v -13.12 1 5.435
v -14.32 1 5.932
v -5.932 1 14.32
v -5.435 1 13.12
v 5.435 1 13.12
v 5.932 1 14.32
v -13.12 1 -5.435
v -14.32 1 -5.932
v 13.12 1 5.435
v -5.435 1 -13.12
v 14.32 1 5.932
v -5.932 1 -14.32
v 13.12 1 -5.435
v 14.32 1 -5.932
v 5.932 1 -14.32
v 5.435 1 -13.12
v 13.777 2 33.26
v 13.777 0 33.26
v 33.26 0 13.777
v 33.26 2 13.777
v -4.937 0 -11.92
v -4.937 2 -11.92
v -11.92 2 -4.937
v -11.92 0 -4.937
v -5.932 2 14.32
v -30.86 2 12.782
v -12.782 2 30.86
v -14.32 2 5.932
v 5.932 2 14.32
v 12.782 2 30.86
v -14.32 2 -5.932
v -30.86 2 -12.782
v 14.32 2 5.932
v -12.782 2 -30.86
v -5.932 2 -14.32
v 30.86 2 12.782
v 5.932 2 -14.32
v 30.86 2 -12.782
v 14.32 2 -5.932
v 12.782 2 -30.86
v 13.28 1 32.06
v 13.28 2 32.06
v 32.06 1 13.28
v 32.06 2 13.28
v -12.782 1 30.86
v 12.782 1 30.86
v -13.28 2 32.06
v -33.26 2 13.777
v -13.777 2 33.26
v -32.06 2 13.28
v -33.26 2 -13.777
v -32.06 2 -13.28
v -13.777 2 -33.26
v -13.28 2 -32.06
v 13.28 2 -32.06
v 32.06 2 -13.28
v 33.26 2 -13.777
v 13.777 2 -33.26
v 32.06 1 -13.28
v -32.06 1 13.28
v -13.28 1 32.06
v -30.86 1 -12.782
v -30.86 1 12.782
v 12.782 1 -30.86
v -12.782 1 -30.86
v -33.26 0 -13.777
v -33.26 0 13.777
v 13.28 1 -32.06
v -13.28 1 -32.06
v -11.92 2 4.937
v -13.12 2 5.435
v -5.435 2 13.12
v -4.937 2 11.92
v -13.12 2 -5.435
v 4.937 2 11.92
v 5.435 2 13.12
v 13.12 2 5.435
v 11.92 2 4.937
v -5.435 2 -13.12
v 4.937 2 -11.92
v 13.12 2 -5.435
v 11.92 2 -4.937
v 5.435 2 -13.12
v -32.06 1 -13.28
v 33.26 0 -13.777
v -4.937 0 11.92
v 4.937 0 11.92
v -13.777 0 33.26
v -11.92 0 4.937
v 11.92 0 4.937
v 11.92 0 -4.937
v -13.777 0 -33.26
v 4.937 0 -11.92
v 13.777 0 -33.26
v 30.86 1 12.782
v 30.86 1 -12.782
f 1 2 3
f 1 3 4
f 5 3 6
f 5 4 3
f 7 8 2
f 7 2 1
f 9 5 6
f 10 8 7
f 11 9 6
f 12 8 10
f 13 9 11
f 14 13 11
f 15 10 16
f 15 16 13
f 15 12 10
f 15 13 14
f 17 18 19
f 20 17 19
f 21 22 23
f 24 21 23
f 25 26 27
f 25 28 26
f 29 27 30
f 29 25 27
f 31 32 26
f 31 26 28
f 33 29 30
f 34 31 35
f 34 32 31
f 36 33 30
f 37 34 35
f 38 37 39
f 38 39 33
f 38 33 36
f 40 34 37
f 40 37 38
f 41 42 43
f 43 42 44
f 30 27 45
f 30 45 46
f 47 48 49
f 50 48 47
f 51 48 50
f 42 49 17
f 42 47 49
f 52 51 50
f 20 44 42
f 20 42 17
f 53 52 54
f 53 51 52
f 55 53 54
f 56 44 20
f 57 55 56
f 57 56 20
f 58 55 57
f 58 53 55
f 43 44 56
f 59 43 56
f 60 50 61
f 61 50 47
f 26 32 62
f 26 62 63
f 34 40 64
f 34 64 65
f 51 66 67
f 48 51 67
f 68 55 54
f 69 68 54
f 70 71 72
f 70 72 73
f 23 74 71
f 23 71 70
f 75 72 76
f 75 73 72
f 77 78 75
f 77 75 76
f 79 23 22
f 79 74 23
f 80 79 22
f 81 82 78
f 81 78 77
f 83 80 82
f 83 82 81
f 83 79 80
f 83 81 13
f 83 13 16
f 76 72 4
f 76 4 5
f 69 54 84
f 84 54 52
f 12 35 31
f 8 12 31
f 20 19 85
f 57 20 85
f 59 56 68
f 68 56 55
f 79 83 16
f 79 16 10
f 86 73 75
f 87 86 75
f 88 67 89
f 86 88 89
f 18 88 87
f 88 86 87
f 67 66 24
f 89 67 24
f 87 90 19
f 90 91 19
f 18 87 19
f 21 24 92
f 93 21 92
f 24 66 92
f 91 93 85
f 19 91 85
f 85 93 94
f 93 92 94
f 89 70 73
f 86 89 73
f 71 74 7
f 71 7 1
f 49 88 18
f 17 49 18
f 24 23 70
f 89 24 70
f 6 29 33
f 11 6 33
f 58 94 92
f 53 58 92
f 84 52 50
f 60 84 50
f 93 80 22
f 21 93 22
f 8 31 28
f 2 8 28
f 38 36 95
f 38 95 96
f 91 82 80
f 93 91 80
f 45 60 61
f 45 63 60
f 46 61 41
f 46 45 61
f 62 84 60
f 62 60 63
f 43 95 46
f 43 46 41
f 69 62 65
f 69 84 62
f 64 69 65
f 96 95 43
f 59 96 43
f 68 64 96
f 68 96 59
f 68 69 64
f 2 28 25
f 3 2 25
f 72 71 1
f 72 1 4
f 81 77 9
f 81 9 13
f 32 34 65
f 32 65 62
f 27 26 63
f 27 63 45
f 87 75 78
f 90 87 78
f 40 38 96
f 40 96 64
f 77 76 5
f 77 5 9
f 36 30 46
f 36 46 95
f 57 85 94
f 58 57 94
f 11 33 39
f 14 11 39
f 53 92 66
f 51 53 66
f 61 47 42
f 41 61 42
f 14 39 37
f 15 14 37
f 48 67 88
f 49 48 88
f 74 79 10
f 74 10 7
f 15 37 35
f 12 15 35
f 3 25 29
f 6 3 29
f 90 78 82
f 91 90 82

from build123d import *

# Parameters (mm, degrees)
EXTRUDE_1_DEPTH     = 2
CUT_EXTRUDE_1_DEPTH = 1
CUT_EXTRUDE_2_DEPTH = 1
CUT_EXTRUDE_3_DEPTH = 3


with BuildPart() as part:
    # 스케치1 → 보스-돌출1 (new body)
    with BuildSketch(Plane(origin=(0, 0, 0), x_dir=(1, 0, 0), z_dir=(0, 1, 0))):
        Polygon((-33.25966317, -13.776603565), (-13.776603565, -33.25966317), (13.776603565, -33.25966317), (33.25966317, -13.776603565), (33.25966317, 13.776603565), (13.776603565, 33.25966317), (-13.776603565, 33.25966317), (-33.25966317, 13.776603565), align=None)
        Polygon((-13.27954729, -32.05966317), (13.27954729, -32.05966317), (32.05966317, -13.27954729), (32.05966317, 13.27954729), (13.27954729, 32.05966317), (-13.27954729, 32.05966317), (-32.05966317, 13.27954729), (-32.05966317, -13.27954729), align=None, mode=Mode.SUBTRACT)
        Polygon((-32.05966317, -13.27954729), (-13.27954729, -32.05966317), (13.27954729, -32.05966317), (32.05966317, -13.27954729), (32.05966317, 13.27954729), (13.27954729, 32.05966317), (-13.27954729, 32.05966317), (-32.05966317, 13.27954729), align=None)
    extrude(amount=EXTRUDE_1_DEPTH)

    # 스케치2 → 컷-돌출1 (cut)
    with BuildSketch(Plane(origin=(0, 2, 0), x_dir=(1, 0, 0), z_dir=(0, 1, 0))):
        Polygon((-32.05966317, -13.27954729), (-13.27954729, -32.05966317), (13.27954729, -32.05966317), (32.05966317, -13.27954729), (32.05966317, 13.27954729), (13.27954729, 32.05966317), (-13.27954729, 32.05966317), (-32.05966317, 13.27954729), align=None)
        Polygon((-30.85966317, -12.782491015), (-12.782491015, -30.85966317), (12.782491015, -30.85966317), (30.85966317, -12.782491015), (30.85966317, 12.782491015), (12.782491015, 30.85966317), (-12.782491015, 30.85966317), (-30.85966317, 12.782491015), align=None, mode=Mode.SUBTRACT)
    extrude(amount=-CUT_EXTRUDE_1_DEPTH, mode=Mode.SUBTRACT)

    # 스케치3 → 컷-돌출2 (cut)
    with BuildSketch(Plane(origin=(0, 2, 0), x_dir=(1, 0, 0), z_dir=(0, 1, 0))):
        Polygon((-14.320132754, -5.931593202), (-5.931593202, -14.320132754), (5.931593202, -14.320132754), (14.320132754, -5.931593202), (14.320132754, 5.931593202), (5.931593202, 14.320132754), (-5.931593202, 14.320132754), (-14.320132754, 5.931593202), align=None)
        Polygon((-5.434536927, -13.120132754), (5.434536927, -13.120132754), (13.120132754, -5.434536927), (13.120132754, 5.434536927), (5.434536927, 13.120132754), (-5.434536927, 13.120132754), (-13.120132754, 5.434536927), (-13.120132754, -5.434536927), align=None, mode=Mode.SUBTRACT)
    extrude(amount=-CUT_EXTRUDE_2_DEPTH, mode=Mode.SUBTRACT)

    # 스케치3<3> → 컷-돌출3 (cut)
    with BuildSketch(Plane(origin=(0, 2, 0), x_dir=(1, 0, 0), z_dir=(0, 1, 0))):
        Polygon((4.937480652, -11.920132754), (11.920132754, -4.937480652), (11.920132754, 4.937480652), (4.937480652, 11.920132754), (-4.937480652, 11.920132754), (-11.920132754, 4.937480652), (-11.920132754, -4.937480652), (-4.937480652, -11.920132754), align=None)
    extrude(amount=-CUT_EXTRUDE_3_DEPTH, mode=Mode.SUBTRACT)


solid = part.part
